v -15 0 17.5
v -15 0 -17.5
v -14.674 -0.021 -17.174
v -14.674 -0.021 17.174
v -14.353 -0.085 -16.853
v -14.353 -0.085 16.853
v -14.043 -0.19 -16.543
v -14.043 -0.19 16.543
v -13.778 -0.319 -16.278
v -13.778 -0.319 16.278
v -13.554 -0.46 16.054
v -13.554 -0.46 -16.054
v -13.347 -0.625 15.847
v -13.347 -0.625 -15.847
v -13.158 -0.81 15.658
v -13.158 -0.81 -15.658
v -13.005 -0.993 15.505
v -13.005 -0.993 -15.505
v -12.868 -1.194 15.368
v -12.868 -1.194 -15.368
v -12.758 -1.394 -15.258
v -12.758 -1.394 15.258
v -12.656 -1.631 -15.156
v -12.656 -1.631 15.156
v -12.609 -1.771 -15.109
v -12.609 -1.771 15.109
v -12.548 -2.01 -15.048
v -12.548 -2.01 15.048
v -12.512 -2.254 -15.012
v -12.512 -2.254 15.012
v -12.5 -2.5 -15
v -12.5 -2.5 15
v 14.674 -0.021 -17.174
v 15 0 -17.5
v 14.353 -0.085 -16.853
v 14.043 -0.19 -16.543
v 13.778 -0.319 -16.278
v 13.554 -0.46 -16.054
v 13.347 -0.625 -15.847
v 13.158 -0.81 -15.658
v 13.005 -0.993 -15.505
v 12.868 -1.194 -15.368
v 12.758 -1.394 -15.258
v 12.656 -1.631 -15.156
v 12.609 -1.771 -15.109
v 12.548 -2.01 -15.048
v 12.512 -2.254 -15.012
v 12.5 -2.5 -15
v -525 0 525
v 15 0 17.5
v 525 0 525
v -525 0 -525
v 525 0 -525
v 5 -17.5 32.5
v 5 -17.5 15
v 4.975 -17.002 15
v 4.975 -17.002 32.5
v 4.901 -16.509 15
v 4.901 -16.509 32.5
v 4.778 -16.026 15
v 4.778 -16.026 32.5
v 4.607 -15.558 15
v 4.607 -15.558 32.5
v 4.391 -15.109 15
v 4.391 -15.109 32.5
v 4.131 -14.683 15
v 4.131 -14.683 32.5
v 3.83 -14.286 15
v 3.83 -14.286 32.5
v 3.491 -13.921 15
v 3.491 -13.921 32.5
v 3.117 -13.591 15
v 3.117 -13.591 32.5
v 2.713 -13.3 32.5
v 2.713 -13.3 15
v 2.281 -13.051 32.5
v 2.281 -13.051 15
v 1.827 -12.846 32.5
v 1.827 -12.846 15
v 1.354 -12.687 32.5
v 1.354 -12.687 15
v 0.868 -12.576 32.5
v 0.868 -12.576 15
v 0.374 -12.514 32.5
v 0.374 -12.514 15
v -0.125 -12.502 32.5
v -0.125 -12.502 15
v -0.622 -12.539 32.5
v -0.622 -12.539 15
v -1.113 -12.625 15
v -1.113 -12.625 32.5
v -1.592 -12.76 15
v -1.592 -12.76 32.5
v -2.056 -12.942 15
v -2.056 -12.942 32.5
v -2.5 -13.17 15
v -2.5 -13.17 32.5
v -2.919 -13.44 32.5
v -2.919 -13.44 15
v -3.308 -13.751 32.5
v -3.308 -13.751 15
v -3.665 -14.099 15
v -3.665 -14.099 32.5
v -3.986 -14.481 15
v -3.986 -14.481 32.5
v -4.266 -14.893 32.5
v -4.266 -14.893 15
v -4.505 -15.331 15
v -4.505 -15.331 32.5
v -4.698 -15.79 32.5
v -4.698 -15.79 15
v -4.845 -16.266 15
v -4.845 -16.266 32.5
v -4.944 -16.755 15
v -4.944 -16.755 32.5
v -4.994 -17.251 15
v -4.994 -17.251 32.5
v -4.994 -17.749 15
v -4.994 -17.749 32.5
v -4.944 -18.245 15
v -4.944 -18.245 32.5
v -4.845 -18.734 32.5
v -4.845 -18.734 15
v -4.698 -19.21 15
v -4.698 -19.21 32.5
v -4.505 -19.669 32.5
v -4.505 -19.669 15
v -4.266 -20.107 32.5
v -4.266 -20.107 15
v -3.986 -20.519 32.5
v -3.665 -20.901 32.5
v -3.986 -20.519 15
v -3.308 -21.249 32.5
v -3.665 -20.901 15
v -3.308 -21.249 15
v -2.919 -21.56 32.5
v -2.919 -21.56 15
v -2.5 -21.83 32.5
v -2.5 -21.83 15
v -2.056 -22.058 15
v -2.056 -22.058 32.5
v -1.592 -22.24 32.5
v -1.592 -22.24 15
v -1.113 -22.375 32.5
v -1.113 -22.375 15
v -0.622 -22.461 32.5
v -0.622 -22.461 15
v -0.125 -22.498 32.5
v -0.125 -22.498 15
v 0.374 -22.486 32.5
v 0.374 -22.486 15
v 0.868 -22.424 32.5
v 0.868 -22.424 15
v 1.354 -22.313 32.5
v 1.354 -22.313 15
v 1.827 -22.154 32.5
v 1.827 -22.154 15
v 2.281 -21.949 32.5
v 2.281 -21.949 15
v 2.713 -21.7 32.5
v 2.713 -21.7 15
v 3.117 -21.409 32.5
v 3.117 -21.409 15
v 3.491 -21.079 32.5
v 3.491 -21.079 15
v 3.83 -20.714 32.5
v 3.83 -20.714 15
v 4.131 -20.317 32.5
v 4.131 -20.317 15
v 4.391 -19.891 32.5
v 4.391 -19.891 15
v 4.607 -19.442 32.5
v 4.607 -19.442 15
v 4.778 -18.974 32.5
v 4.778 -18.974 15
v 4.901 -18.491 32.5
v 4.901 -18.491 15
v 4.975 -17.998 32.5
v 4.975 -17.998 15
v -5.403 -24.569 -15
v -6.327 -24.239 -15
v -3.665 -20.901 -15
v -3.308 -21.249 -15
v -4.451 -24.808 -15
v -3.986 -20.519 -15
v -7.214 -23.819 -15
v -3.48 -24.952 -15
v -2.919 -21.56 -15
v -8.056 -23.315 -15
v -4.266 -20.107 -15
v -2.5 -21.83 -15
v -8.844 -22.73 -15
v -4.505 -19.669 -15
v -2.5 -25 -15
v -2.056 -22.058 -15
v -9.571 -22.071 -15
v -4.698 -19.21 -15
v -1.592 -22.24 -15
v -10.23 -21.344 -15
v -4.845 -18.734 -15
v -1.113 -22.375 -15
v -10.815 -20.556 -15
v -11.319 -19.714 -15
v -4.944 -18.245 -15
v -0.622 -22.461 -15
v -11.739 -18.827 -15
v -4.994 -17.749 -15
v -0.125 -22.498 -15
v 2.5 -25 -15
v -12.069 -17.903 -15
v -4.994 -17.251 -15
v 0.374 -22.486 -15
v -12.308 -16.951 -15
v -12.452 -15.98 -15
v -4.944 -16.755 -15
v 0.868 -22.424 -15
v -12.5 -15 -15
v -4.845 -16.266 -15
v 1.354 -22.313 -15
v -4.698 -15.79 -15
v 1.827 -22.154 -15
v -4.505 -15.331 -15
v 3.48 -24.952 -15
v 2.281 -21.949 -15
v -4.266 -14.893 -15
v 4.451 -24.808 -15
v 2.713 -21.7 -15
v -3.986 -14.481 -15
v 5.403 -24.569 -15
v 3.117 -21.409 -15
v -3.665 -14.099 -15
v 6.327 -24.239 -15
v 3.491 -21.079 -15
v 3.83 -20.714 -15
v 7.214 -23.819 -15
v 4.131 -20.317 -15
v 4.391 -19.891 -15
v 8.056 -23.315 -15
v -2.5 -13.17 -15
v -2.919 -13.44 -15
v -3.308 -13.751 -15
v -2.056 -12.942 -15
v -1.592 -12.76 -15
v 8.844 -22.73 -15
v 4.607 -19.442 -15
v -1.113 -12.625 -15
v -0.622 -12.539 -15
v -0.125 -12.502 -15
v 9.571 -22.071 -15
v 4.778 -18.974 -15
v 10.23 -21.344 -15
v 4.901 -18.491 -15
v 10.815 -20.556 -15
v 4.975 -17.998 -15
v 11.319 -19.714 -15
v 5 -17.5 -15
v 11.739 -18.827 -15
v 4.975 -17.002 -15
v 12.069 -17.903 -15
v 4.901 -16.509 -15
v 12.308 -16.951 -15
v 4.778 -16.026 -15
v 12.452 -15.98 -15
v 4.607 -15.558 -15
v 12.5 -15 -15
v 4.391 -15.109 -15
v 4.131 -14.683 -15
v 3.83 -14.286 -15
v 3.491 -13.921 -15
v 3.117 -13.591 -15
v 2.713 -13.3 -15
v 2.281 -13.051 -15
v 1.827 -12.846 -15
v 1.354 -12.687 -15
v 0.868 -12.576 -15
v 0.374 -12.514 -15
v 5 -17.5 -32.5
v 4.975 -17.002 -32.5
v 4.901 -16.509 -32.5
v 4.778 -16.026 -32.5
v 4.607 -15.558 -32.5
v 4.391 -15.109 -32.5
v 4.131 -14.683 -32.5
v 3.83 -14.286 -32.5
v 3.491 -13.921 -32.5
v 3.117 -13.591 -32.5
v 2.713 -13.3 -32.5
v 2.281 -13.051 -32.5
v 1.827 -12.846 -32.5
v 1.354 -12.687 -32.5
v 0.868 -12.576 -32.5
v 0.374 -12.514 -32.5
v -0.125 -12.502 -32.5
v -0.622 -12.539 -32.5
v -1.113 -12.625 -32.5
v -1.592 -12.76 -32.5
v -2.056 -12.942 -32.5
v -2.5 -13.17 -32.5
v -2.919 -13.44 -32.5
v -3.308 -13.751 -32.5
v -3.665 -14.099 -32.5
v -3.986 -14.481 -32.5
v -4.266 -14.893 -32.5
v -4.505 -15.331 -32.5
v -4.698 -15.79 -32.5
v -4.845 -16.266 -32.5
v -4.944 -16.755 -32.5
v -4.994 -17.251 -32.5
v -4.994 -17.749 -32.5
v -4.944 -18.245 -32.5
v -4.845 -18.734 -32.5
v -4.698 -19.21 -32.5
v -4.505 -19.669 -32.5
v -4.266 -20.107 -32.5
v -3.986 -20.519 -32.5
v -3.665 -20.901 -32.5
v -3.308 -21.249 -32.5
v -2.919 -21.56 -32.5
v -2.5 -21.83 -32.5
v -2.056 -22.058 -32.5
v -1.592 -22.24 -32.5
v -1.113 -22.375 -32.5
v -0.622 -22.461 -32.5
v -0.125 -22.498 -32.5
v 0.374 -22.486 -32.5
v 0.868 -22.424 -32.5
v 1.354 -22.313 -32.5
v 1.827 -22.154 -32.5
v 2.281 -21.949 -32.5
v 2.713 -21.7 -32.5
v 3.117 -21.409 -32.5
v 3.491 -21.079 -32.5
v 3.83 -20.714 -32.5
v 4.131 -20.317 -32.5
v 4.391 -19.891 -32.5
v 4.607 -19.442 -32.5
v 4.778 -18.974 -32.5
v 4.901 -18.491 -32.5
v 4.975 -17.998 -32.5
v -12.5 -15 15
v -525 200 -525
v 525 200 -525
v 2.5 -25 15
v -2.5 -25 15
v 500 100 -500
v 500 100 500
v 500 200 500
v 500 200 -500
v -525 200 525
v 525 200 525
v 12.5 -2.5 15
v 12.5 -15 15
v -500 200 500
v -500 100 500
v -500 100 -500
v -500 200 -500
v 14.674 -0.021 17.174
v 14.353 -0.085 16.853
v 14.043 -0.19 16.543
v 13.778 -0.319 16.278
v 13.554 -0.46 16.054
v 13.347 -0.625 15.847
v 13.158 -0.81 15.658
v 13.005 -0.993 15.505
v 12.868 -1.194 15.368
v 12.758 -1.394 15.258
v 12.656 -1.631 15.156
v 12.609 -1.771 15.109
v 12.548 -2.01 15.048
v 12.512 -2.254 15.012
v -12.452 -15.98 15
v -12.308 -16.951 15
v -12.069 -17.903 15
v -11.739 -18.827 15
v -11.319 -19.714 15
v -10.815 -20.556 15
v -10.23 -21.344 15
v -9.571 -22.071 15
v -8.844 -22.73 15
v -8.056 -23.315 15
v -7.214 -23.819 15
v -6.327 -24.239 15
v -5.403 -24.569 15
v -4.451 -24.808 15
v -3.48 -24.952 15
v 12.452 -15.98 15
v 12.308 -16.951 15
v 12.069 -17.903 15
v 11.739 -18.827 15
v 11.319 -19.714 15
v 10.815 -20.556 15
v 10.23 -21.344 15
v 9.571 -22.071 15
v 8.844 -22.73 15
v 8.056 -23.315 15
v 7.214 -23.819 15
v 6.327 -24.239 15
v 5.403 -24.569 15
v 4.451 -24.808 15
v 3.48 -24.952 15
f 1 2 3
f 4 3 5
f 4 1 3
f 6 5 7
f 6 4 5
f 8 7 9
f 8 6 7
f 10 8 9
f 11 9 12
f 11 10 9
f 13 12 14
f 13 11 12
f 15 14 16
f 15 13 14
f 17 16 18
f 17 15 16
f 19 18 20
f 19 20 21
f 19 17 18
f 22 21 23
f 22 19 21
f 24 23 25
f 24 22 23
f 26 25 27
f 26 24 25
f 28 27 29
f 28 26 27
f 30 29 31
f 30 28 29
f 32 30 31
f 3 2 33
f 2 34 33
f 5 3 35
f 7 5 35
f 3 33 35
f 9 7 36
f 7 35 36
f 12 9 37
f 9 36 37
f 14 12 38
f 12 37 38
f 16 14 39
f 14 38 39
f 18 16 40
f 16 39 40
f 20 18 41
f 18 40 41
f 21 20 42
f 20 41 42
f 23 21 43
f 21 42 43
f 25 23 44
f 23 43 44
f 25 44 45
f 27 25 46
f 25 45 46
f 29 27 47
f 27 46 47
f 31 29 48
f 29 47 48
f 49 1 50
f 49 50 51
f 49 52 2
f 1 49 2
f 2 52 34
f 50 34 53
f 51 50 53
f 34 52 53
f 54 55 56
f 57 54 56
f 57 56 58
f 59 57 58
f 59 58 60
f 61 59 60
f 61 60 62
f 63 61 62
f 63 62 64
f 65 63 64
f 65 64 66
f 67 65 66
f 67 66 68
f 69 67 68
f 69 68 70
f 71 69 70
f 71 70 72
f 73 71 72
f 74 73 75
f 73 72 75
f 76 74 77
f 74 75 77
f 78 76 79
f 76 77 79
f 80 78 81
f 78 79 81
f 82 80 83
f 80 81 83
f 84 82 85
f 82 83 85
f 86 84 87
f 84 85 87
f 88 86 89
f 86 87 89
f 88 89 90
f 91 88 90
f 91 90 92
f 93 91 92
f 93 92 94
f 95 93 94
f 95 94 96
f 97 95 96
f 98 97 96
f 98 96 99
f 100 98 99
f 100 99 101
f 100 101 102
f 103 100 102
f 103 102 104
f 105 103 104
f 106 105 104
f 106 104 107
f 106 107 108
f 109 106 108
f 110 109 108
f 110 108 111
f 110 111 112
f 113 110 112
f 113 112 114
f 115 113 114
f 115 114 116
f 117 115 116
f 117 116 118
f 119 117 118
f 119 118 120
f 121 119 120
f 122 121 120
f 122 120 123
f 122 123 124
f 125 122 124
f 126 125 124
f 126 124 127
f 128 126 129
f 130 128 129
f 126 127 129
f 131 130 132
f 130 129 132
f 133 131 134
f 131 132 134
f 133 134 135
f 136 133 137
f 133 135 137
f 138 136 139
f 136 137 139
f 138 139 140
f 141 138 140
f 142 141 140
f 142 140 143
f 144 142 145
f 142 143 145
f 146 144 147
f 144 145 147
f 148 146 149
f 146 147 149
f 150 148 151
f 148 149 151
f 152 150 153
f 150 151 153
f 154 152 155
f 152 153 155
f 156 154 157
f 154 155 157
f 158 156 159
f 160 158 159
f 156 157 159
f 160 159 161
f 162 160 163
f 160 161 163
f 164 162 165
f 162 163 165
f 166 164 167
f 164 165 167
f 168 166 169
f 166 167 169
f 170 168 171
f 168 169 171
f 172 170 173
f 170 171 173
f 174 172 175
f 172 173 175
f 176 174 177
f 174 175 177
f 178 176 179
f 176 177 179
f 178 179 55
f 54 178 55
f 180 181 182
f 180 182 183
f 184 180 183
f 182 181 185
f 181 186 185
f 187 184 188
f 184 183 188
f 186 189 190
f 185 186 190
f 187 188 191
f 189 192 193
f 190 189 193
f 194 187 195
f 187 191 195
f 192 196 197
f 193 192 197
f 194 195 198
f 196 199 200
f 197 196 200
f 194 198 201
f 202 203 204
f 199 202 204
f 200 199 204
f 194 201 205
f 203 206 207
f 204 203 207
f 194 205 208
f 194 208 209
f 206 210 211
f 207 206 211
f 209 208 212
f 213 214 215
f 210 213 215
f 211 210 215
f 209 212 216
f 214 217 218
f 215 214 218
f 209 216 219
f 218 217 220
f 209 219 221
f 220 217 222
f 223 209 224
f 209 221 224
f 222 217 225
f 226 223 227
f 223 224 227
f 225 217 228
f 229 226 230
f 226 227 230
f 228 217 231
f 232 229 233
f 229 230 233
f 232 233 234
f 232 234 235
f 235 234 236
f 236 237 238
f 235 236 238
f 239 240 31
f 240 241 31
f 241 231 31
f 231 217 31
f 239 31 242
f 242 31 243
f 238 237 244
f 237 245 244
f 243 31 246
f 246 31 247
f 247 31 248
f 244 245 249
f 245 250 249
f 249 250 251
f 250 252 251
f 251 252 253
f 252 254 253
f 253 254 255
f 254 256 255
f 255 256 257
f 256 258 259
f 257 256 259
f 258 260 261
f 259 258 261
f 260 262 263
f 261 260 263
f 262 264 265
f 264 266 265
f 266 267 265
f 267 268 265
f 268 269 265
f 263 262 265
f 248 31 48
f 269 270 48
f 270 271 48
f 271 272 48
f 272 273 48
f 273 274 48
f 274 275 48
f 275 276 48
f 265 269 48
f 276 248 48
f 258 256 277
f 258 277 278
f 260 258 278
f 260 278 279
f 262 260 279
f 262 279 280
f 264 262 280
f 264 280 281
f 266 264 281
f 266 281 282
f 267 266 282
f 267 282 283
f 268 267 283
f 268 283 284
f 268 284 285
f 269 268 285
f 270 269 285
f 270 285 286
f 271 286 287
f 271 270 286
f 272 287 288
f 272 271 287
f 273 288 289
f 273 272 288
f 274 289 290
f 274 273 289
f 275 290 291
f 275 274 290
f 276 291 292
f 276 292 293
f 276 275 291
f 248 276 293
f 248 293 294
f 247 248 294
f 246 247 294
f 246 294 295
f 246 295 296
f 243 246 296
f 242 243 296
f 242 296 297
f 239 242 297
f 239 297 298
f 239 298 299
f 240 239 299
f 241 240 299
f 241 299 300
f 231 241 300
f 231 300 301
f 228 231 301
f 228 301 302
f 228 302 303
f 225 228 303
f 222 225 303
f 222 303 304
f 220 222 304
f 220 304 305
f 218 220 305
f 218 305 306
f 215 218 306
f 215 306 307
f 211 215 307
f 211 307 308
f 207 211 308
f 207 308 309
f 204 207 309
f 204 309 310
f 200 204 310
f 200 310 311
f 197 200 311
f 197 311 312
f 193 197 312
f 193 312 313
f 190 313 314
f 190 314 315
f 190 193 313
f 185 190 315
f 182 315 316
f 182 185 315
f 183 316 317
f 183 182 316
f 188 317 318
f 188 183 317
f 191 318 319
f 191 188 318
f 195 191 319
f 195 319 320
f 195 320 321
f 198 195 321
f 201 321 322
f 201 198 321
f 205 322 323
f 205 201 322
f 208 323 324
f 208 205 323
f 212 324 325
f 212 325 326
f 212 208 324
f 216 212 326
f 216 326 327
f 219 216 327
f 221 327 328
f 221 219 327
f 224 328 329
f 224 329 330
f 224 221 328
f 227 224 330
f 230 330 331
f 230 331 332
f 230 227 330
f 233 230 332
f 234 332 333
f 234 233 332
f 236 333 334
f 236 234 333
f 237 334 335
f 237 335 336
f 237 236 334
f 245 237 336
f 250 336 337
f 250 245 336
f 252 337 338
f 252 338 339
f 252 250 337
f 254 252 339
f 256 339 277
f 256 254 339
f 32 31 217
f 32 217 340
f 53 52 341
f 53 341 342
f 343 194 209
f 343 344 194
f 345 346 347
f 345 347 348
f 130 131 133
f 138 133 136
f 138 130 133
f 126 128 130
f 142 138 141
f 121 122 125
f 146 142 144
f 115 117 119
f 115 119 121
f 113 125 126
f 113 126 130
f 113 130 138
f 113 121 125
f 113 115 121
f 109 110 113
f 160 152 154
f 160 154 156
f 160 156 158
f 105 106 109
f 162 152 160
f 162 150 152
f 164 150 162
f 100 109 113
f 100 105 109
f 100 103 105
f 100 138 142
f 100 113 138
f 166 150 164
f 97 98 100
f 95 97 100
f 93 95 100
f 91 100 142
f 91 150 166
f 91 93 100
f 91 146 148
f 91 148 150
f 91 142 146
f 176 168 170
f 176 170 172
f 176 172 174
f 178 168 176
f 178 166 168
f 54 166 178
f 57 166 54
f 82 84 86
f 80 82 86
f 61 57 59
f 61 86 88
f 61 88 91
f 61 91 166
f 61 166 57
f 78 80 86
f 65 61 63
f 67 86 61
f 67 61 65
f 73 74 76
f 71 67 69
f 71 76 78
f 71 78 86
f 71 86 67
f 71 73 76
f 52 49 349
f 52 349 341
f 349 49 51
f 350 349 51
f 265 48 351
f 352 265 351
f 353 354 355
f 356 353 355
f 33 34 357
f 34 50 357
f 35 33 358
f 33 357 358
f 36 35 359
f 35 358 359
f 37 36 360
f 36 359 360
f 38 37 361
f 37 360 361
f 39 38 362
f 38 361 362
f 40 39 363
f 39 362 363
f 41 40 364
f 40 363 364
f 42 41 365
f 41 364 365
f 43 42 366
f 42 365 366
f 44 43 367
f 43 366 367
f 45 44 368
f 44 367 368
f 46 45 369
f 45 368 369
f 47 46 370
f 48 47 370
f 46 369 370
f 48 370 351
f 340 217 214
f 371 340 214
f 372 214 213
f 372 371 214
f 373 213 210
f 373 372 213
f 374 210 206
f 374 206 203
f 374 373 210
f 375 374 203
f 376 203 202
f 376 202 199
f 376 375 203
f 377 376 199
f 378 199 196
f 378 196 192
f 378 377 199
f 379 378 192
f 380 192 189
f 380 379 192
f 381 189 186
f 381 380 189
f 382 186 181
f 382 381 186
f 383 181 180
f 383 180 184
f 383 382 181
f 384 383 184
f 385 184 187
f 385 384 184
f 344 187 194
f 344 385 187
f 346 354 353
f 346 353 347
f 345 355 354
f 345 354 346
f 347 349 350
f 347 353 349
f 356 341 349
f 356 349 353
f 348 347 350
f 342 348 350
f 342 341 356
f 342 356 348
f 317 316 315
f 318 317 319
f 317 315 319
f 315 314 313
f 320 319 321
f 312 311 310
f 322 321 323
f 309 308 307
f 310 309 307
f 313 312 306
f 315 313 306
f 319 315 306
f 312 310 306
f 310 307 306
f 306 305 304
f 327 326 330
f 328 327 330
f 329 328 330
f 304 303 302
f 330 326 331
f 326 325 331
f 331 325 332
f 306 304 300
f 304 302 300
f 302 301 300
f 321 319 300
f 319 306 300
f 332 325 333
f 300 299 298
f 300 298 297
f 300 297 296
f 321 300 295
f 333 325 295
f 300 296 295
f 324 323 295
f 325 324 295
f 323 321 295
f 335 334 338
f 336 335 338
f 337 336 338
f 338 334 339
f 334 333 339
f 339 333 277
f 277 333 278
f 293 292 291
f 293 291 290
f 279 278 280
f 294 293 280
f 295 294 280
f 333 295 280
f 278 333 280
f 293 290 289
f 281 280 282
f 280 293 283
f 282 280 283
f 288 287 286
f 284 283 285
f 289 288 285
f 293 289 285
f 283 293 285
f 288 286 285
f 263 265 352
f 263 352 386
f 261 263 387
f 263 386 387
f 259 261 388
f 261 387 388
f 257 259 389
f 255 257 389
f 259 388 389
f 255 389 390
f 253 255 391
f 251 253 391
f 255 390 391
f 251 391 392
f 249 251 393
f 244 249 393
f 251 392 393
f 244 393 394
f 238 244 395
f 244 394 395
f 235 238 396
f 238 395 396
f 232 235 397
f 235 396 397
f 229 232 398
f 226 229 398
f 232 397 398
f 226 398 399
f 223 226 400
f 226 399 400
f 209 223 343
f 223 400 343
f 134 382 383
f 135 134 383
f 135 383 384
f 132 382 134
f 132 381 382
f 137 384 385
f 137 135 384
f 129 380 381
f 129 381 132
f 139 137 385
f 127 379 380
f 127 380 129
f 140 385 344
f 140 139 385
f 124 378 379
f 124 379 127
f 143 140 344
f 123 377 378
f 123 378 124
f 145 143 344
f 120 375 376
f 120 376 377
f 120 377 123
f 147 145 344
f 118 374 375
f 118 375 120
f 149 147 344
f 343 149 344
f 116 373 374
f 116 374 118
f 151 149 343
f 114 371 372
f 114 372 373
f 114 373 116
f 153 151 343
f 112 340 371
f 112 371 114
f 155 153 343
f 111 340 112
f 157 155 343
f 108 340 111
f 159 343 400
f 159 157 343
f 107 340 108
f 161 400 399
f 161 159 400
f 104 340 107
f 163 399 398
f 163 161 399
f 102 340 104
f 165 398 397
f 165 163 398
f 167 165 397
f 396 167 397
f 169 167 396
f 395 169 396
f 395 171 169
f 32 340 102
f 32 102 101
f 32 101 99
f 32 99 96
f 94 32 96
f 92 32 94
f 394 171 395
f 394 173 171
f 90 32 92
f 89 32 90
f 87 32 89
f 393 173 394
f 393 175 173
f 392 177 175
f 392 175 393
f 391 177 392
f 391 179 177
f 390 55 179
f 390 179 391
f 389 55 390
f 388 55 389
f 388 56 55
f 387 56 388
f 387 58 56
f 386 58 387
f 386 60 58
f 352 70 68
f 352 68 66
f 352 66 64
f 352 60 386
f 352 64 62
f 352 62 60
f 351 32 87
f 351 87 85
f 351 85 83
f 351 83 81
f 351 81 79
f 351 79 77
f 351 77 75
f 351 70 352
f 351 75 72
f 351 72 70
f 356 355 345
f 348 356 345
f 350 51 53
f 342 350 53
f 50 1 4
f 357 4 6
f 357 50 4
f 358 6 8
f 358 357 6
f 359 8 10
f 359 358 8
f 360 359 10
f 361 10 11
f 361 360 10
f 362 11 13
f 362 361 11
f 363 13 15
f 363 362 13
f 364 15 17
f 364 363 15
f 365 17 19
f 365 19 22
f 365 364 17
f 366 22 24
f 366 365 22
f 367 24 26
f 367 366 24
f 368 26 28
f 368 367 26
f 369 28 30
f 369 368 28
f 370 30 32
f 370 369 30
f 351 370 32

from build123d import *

# Parameters (mm, degrees)
SKETCH1_W                = 1000
SKETCH1_H                = 1000
BOSS_EXTRUDE1_DEPTH      = 100
SKETCH2_W                = 1050
SKETCH2_H                = 1050
SKETCH2_W_2              = 1000
SKETCH2_H_2              = 1000
BOSS_EXTRUDE3_DEPTH      = 200
SKETCH3_W                = 25
SKETCH3_H                = 30
BOSS_EXTRUDE4_DEPTH      = 25
FILLET1_R                = 2.5
FILLET2_R                = 10
SKETCH5_R                = 5
BOSS_EXTRUDE5_DEPTH      = 32.5
BOSS_EXTRUDE5_DEPTH_BACK = 32.5


with BuildPart() as part:
    # Sketch1 → Boss-Extrude1 (new body)
    with BuildSketch(Plane(origin=(0, 0, 0), x_dir=(1, 0, 0), z_dir=(0, 1, 0))):
        Rectangle(SKETCH1_W, SKETCH1_H)
    extrude(amount=BOSS_EXTRUDE1_DEPTH)

    # Sketch2 → Boss-Extrude3 (add)
    with BuildSketch(Plane(origin=(0, 0, 0), x_dir=(1, 0, 0), z_dir=(0, 1, 0))):
        Rectangle(SKETCH2_W, SKETCH2_H)
        Rectangle(SKETCH2_W_2, SKETCH2_H_2, mode=Mode.SUBTRACT)
    extrude(amount=BOSS_EXTRUDE3_DEPTH)

    # Sketch3 → Boss-Extrude4 (add)
    with BuildSketch(Plane.XZ):
        Rectangle(SKETCH3_W, SKETCH3_H)
    extrude(amount=BOSS_EXTRUDE4_DEPTH)

    # Fillet1
    fillet1_edges = [part.edges().sort_by_distance(p)[0] for p in [
        (12.5, 0, 0),
        (0, 0, 15),
        (-12.5, 0, 0),
        (0, 0, -15),
    ]]
    fillet(fillet1_edges, radius=FILLET1_R)

    # Fillet2
    fillet2_edges = [part.edges().sort_by_distance(p)[0] for p in [
        (12.5, -25, 0),
        (-12.5, -25, 0),
    ]]
    fillet(fillet2_edges, radius=FILLET2_R)

    # Sketch5 → Boss-Extrude5 (add, two sides)
    with BuildSketch(Plane.XY) as boss_extrude5_sk:
        with Locations((0, -17.5)):
            Circle(SKETCH5_R)
    extrude(amount=BOSS_EXTRUDE5_DEPTH)
    extrude(boss_extrude5_sk.sketch, amount=-BOSS_EXTRUDE5_DEPTH_BACK)


solid = part.part
